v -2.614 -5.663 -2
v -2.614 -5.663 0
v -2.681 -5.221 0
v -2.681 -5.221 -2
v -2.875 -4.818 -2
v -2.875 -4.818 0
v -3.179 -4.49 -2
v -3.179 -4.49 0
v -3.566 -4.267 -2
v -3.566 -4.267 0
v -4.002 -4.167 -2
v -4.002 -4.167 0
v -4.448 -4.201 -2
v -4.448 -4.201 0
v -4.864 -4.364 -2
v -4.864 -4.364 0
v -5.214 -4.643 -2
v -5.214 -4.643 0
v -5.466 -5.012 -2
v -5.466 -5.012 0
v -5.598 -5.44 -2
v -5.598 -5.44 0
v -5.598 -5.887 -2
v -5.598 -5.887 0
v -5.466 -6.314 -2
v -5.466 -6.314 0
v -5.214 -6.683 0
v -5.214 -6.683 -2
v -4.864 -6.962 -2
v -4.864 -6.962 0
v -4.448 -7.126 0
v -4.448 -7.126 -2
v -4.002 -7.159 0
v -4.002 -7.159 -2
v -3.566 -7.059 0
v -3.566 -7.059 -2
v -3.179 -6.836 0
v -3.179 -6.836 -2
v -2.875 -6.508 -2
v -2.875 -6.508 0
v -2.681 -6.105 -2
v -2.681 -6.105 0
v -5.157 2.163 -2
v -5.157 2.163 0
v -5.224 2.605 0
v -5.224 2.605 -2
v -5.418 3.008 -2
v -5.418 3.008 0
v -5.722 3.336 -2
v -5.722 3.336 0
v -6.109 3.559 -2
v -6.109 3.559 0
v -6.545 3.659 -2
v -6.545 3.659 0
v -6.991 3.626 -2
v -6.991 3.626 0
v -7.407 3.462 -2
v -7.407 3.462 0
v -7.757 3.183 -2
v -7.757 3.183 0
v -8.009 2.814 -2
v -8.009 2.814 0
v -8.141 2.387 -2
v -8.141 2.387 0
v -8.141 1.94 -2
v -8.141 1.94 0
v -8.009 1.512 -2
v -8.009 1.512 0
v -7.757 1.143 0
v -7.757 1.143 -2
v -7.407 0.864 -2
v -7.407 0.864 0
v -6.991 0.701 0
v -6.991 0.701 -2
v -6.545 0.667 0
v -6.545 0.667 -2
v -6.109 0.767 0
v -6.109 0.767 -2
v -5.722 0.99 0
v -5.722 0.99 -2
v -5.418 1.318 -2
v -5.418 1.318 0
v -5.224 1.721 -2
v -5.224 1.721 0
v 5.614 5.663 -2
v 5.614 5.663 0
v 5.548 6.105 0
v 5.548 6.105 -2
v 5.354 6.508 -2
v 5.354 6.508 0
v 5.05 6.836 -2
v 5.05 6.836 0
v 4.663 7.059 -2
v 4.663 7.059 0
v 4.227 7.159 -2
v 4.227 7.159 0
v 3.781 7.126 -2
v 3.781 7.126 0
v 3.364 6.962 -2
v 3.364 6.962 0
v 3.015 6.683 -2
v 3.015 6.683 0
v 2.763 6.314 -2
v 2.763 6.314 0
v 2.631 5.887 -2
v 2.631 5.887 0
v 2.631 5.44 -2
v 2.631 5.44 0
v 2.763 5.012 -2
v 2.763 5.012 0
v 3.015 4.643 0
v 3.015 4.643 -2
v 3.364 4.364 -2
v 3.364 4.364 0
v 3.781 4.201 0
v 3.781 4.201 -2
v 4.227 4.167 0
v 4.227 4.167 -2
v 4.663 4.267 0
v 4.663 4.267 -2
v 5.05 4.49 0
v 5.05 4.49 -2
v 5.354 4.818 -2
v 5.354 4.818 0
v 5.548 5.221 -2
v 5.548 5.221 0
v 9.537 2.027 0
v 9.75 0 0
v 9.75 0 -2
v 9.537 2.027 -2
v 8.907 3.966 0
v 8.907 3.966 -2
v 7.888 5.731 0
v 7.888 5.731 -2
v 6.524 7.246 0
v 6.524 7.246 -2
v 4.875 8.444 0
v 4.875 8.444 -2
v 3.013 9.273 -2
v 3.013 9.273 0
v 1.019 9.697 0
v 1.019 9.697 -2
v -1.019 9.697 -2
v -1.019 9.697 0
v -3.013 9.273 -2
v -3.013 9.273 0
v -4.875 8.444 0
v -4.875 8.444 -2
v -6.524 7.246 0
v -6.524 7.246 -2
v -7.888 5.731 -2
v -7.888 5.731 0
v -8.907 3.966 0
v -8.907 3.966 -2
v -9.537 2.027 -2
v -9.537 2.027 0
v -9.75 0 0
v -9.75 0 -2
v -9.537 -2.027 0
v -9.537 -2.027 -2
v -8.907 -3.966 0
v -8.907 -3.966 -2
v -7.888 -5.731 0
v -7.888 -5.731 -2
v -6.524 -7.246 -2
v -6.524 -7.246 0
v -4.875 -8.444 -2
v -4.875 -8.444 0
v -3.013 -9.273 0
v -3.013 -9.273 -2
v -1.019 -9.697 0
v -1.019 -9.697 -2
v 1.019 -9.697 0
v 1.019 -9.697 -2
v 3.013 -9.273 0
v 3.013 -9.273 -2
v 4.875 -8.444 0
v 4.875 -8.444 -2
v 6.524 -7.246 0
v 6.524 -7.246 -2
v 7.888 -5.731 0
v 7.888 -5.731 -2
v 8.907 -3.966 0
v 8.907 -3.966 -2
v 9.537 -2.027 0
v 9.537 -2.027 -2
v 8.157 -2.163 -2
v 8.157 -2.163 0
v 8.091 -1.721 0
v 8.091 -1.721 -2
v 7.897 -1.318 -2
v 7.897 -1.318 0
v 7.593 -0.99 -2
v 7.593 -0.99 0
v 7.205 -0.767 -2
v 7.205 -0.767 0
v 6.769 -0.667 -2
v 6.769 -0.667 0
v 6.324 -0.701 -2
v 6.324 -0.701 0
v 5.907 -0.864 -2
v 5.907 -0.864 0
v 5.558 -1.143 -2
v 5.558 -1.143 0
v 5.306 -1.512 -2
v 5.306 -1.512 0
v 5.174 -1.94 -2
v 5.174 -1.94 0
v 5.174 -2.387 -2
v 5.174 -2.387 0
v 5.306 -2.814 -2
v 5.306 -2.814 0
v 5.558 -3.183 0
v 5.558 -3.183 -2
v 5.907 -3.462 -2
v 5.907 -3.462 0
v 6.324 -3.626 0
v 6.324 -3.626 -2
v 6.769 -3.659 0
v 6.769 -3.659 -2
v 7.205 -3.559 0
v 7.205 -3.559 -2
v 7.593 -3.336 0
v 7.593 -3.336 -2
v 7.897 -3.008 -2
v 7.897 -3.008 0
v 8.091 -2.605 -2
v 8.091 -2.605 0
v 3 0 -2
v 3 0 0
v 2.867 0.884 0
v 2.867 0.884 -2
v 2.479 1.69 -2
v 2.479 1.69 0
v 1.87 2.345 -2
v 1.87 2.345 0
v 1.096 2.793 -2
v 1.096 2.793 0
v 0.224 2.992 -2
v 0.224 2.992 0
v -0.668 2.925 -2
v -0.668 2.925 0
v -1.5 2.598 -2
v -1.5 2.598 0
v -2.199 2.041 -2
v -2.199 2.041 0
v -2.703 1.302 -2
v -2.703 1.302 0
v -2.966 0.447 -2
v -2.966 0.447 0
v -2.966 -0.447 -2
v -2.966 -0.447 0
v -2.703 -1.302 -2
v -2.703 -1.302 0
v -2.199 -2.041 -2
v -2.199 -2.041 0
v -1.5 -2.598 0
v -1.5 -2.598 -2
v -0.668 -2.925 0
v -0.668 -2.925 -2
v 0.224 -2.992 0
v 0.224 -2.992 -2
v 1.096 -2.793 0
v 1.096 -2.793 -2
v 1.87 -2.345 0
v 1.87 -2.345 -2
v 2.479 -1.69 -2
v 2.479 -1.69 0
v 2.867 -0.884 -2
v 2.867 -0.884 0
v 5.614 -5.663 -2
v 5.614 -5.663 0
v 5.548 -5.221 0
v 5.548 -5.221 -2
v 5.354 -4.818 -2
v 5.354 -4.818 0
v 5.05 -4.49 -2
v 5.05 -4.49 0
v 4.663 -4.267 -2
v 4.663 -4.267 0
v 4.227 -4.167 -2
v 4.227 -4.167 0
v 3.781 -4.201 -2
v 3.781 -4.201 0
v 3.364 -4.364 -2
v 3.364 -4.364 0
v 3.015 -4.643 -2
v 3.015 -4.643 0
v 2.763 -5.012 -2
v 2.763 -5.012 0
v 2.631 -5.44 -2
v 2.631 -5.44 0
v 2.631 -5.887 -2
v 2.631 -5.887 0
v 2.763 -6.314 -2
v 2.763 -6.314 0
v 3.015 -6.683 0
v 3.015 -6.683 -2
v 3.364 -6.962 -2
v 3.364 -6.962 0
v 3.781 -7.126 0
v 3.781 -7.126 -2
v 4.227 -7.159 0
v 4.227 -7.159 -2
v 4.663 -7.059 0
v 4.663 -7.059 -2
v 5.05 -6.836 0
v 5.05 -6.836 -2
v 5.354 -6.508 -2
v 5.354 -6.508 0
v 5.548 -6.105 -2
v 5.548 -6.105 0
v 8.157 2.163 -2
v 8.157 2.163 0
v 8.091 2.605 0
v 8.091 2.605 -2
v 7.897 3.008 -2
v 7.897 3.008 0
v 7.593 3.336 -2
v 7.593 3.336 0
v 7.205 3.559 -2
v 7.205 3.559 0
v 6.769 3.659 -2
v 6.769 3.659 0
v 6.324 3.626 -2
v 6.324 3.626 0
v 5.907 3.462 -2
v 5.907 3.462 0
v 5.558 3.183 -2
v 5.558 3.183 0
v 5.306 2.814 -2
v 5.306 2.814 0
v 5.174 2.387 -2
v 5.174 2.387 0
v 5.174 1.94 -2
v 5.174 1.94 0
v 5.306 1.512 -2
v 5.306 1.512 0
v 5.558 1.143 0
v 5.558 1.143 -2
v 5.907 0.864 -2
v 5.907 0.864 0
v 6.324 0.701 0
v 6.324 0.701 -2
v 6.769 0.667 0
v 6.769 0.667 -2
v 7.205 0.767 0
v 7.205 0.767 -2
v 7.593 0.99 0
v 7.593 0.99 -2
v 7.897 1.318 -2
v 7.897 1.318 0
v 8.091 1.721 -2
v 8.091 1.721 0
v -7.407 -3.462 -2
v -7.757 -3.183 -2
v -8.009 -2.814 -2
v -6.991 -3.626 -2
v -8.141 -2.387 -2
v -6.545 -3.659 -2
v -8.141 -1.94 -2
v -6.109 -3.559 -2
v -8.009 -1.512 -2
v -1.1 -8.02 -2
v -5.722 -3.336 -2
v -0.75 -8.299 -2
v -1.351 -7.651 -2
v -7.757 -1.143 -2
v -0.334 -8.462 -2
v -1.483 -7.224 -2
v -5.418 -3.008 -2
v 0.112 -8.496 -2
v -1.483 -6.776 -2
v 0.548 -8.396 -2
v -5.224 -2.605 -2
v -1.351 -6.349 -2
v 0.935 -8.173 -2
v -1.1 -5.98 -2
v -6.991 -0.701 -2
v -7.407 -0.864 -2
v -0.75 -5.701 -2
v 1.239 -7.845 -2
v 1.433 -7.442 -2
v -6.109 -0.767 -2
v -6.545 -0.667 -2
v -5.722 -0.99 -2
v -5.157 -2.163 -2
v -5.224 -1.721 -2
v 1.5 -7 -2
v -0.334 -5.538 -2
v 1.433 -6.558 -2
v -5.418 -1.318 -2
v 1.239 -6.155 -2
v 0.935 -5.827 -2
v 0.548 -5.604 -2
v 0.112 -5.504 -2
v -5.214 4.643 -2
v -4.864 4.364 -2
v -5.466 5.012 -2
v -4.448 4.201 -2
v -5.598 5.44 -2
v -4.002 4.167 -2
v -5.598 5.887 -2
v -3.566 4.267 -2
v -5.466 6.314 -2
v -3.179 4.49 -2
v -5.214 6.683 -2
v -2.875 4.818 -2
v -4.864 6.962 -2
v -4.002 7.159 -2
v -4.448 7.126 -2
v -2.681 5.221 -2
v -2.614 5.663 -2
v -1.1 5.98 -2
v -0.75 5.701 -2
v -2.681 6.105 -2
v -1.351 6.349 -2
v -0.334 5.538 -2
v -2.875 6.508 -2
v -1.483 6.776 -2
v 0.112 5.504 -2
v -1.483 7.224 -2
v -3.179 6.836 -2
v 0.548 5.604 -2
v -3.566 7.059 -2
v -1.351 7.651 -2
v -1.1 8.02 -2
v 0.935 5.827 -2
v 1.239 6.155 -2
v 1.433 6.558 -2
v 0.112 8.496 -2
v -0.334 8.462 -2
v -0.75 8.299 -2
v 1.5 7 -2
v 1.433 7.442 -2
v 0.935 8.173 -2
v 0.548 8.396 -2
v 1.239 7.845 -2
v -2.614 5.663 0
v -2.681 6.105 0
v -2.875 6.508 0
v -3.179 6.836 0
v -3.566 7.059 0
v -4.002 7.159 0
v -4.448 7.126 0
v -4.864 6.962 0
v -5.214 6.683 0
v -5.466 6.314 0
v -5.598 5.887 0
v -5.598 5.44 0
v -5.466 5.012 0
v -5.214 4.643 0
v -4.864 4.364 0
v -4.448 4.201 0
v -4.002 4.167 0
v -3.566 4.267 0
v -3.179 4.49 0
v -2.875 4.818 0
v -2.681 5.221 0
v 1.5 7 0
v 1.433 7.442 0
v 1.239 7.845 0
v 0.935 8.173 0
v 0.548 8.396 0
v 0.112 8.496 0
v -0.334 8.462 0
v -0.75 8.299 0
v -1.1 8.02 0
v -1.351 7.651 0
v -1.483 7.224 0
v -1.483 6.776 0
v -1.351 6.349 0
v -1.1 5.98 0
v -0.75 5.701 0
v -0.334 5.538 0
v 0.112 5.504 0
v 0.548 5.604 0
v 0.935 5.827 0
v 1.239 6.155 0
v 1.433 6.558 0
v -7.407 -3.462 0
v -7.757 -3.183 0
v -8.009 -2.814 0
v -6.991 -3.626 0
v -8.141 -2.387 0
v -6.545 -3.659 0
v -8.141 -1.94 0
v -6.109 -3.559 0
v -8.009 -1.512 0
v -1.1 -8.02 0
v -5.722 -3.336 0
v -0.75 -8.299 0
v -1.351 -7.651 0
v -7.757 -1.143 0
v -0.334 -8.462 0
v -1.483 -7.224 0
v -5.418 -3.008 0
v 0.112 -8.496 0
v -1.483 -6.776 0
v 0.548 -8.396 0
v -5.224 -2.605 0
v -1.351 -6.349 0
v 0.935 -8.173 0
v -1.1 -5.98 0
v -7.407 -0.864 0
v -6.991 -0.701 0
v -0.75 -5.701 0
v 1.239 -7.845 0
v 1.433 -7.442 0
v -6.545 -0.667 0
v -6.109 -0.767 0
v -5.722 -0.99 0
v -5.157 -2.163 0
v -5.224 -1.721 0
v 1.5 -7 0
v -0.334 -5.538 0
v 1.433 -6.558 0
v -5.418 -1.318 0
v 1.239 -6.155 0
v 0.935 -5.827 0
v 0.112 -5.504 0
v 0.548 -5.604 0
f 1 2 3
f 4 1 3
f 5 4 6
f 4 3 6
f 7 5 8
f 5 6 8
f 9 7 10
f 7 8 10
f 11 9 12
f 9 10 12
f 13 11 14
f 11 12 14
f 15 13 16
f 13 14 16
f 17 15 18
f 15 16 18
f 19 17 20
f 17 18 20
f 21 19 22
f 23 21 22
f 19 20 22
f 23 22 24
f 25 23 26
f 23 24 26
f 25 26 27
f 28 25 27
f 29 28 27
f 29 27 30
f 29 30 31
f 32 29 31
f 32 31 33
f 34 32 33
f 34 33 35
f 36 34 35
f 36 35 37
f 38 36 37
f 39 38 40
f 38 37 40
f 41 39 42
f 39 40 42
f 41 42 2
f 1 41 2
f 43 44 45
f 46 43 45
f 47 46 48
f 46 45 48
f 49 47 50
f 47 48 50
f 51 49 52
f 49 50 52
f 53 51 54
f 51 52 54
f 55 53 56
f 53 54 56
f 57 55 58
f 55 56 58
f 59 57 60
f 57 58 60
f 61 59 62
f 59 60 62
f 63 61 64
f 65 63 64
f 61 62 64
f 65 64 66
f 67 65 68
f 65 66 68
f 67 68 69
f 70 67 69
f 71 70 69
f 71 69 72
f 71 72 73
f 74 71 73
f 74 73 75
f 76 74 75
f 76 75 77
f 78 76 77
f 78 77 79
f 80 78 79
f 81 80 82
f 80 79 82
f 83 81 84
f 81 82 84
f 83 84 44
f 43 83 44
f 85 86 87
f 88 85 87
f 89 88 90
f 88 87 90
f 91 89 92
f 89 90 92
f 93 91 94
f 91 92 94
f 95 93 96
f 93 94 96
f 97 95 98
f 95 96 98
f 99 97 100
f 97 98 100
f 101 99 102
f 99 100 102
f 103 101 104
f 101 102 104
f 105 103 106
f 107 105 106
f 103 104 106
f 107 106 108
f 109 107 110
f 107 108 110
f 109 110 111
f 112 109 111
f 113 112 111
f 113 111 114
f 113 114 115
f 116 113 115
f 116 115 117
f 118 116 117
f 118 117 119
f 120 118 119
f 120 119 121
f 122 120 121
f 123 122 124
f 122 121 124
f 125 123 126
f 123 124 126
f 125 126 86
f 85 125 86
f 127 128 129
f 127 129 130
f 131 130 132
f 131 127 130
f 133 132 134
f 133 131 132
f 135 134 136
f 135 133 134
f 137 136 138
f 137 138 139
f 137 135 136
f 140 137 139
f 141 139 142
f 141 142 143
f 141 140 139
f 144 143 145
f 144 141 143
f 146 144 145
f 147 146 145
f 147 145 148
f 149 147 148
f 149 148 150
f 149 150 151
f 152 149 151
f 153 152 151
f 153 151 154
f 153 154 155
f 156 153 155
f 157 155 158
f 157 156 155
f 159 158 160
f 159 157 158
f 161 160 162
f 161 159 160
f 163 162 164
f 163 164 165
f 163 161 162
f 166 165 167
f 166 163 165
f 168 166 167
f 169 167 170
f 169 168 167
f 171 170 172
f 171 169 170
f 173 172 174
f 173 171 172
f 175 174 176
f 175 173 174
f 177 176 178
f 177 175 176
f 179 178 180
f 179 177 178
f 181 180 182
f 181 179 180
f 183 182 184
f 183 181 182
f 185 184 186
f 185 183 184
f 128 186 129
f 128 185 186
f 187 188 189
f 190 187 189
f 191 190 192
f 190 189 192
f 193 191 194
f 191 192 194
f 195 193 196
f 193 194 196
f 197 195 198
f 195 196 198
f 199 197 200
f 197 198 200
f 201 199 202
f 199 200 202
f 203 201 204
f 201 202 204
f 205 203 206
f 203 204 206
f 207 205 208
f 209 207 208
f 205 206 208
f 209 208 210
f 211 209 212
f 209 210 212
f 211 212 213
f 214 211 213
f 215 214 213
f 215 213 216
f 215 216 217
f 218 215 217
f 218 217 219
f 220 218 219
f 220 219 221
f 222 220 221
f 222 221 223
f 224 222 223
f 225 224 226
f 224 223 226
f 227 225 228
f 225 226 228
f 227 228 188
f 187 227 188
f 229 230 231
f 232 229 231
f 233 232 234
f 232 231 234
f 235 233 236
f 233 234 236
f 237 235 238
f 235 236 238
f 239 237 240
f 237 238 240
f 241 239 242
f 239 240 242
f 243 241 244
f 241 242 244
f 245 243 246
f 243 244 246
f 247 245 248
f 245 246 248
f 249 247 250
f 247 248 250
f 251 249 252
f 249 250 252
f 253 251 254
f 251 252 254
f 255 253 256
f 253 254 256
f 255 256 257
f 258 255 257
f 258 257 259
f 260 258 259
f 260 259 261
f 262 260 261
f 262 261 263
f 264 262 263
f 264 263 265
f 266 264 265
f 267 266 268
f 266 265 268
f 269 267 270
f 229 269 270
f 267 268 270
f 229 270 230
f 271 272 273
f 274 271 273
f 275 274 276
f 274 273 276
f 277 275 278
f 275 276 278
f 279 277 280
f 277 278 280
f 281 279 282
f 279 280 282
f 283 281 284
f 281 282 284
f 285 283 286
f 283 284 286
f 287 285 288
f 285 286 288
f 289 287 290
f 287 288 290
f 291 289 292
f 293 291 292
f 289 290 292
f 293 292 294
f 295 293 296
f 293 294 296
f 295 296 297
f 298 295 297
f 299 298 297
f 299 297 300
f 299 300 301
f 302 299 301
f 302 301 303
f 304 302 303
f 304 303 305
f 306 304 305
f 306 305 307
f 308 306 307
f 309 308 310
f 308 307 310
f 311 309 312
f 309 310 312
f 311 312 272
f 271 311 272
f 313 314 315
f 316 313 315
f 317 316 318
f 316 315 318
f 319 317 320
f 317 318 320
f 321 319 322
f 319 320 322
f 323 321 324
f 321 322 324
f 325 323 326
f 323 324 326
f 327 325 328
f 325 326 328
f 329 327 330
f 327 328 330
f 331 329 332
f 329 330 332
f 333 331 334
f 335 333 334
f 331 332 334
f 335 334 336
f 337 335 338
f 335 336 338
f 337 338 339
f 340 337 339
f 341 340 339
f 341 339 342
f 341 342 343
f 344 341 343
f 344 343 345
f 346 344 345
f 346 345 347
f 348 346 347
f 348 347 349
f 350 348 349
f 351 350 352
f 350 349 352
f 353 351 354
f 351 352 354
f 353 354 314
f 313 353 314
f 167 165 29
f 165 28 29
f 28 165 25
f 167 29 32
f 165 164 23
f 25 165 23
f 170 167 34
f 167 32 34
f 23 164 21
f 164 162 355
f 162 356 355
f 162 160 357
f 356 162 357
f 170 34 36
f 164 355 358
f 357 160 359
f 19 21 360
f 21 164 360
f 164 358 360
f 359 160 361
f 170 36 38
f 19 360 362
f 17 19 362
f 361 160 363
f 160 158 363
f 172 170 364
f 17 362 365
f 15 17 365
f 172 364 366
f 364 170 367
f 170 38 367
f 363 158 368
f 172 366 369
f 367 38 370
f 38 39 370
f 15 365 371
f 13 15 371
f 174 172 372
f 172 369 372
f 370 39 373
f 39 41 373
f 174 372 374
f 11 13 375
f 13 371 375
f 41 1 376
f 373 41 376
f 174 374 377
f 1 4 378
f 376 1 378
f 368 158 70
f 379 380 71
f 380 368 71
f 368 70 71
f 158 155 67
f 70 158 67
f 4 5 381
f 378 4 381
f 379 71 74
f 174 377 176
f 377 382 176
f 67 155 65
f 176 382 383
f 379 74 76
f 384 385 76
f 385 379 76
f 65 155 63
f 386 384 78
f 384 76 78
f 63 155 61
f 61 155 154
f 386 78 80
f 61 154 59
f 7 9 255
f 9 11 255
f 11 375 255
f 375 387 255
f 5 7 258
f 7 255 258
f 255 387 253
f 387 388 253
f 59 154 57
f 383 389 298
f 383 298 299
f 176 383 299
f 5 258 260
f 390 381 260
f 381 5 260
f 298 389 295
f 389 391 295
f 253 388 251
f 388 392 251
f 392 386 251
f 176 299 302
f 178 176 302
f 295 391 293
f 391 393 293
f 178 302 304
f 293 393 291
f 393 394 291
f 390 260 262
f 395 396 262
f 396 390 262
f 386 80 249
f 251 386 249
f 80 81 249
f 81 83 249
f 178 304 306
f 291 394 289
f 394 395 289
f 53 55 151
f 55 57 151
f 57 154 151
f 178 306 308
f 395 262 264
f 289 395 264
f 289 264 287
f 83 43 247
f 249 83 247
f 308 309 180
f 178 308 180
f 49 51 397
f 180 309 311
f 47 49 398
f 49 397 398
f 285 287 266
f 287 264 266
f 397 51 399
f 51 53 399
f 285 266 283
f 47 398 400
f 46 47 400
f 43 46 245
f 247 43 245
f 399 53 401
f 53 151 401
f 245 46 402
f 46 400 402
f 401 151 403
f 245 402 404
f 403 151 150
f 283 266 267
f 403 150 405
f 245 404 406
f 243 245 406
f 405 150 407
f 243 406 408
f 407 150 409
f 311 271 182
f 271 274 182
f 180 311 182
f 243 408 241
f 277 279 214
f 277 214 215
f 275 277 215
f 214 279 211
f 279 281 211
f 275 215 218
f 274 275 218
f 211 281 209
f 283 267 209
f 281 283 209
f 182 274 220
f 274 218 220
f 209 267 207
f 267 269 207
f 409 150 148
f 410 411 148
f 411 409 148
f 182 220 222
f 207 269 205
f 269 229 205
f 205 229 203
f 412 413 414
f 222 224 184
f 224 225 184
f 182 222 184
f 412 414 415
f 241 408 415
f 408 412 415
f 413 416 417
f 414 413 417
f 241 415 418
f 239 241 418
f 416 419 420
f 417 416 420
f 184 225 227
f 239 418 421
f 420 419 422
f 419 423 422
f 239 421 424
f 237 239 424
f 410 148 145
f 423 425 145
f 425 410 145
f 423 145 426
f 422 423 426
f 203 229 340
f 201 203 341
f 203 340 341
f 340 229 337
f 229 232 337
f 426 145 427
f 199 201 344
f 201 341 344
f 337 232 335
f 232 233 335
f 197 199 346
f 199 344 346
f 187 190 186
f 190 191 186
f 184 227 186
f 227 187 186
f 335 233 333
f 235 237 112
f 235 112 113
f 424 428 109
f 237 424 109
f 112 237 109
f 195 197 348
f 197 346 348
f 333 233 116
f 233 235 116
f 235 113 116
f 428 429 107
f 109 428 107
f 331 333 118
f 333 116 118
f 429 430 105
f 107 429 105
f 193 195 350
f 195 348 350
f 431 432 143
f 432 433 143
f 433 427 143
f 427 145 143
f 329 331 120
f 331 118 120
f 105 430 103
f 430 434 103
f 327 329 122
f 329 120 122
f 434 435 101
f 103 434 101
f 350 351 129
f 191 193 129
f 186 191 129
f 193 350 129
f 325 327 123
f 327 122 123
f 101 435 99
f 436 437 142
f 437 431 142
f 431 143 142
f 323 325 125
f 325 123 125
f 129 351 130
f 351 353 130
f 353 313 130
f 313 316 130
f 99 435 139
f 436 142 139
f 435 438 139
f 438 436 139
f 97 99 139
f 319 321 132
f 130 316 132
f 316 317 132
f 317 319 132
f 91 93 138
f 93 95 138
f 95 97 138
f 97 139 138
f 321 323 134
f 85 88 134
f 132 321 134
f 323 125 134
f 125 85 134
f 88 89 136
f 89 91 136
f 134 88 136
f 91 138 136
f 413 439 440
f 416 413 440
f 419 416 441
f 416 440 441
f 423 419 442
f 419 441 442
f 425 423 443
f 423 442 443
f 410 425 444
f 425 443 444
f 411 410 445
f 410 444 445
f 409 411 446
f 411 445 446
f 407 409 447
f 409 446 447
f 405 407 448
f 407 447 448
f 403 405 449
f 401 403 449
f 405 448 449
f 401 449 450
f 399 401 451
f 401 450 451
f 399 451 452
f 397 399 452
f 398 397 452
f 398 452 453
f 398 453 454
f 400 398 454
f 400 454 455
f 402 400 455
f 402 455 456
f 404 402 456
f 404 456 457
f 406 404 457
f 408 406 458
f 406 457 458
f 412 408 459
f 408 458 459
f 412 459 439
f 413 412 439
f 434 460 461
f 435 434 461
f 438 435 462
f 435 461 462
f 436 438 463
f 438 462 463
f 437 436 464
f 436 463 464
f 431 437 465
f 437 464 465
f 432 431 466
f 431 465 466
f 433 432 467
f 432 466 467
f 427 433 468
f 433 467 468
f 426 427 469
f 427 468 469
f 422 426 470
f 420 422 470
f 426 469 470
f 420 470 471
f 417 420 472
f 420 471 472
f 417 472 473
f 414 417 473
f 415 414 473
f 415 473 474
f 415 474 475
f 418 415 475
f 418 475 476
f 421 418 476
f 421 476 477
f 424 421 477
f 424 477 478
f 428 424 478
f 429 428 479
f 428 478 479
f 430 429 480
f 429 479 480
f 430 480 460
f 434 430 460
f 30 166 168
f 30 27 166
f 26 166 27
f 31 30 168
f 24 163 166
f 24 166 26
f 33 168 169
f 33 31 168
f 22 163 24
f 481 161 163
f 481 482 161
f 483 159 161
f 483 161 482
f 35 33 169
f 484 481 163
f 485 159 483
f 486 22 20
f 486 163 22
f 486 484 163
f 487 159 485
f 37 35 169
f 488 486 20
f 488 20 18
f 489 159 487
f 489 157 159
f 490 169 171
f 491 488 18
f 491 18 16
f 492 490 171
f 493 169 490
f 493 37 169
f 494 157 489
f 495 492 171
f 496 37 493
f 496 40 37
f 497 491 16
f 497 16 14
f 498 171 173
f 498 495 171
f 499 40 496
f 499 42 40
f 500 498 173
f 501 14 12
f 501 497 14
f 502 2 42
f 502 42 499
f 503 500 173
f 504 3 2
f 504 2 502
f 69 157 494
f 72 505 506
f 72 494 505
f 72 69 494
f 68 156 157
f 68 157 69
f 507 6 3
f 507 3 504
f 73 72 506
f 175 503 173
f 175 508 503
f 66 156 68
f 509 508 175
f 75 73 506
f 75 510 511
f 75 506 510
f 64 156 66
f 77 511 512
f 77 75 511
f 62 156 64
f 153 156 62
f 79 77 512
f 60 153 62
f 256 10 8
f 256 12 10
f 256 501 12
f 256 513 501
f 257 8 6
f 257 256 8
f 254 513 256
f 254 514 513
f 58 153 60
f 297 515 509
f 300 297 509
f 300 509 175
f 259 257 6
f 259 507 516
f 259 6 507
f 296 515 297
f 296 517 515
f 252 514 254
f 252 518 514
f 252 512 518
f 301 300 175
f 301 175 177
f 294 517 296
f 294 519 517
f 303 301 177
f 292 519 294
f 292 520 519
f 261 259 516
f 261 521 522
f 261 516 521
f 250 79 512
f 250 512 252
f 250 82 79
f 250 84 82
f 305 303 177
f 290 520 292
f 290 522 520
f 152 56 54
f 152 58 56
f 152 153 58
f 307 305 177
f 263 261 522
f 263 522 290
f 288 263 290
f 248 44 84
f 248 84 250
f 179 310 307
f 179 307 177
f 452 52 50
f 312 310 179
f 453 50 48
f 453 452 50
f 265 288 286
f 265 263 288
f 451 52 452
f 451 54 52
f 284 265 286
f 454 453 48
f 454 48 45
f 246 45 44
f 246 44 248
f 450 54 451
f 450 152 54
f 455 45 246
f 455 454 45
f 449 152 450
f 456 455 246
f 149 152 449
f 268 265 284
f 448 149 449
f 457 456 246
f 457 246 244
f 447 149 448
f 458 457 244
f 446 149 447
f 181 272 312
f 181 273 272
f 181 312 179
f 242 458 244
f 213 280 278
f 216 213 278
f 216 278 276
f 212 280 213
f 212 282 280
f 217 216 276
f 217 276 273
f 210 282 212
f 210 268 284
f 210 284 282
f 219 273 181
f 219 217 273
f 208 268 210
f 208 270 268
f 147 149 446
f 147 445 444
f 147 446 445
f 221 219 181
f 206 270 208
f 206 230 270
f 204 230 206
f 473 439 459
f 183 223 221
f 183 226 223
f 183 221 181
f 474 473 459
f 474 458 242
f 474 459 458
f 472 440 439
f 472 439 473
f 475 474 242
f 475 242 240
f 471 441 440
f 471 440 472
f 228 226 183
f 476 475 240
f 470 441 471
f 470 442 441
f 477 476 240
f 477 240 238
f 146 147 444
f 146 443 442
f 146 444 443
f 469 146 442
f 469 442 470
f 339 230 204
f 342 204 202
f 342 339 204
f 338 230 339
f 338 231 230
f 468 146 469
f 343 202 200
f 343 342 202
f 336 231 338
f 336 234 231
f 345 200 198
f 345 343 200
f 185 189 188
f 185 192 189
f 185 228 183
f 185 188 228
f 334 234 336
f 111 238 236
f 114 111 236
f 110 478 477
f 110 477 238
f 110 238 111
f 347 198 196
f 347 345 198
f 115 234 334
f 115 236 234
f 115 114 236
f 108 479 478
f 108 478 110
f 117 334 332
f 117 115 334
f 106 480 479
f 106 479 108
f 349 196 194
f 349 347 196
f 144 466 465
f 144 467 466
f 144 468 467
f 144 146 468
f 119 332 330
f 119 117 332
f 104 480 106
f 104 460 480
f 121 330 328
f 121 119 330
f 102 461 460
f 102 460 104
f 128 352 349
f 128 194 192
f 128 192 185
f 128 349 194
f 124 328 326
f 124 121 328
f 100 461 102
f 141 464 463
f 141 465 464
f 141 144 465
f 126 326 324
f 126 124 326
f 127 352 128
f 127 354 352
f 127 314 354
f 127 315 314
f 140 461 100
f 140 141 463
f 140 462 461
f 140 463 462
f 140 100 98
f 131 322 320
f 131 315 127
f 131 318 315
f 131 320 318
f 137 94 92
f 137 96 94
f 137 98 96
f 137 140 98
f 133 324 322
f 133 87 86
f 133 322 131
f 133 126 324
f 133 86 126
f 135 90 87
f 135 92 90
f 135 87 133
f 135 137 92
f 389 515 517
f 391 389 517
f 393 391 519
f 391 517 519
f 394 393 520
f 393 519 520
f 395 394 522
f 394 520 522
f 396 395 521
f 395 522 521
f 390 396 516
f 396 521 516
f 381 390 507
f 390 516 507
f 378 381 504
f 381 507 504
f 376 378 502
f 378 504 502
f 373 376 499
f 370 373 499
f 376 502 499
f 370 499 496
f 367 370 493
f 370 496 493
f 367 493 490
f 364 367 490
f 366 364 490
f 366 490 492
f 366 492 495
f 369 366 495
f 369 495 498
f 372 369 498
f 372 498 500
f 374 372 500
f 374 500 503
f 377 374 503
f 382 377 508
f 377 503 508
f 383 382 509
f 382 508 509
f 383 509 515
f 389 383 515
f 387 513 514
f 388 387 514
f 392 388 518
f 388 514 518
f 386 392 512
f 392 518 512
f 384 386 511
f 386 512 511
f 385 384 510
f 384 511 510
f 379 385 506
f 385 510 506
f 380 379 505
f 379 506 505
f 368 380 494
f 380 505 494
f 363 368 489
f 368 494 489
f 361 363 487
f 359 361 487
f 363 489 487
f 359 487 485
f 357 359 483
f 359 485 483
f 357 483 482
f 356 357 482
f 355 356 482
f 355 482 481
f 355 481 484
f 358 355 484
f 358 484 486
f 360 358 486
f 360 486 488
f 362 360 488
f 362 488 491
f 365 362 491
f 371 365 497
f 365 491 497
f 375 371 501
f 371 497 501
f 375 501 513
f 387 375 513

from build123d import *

# Parameters (mm, degrees)
SKETCH1_R           = 9.75
SKETCH1_R_2         = 3
SKETCH1_R_3         = 1.5
BOSS_EXTRUDE1_DEPTH = 2


with BuildPart() as part:
    # Sketch1 → Boss-Extrude1 (new body)
    with BuildSketch(Plane.XY):
        Circle(SKETCH1_R)
        Circle(SKETCH1_R_2, mode=Mode.SUBTRACT)
        with Locations((0, 7)):
            Circle(SKETCH1_R_3, mode=Mode.SUBTRACT)
        with Locations((4.114496766, 5.663118961)):
            Circle(SKETCH1_R_3, mode=Mode.SUBTRACT)
        with Locations((6.657395614, 2.163118961)):
            Circle(SKETCH1_R_3, mode=Mode.SUBTRACT)
        with Locations((6.657395614, -2.163118961)):
            Circle(SKETCH1_R_3, mode=Mode.SUBTRACT)
        with Locations((4.114496766, -5.663118961)):
            Circle(SKETCH1_R_3, mode=Mode.SUBTRACT)
        with Locations((0, -7)):
            Circle(SKETCH1_R_3, mode=Mode.SUBTRACT)
        with Locations((-4.114496766, -5.663118961)):
            Circle(SKETCH1_R_3, mode=Mode.SUBTRACT)
        with Locations((-6.657395614, -2.163118961)):
            Circle(SKETCH1_R_3, mode=Mode.SUBTRACT)
        with Locations((-6.657395614, 2.163118961)):
            Circle(SKETCH1_R_3, mode=Mode.SUBTRACT)
        with Locations((-4.114496766, 5.663118961)):
            Circle(SKETCH1_R_3, mode=Mode.SUBTRACT)
    extrude(amount=-BOSS_EXTRUDE1_DEPTH)


solid = part.part
